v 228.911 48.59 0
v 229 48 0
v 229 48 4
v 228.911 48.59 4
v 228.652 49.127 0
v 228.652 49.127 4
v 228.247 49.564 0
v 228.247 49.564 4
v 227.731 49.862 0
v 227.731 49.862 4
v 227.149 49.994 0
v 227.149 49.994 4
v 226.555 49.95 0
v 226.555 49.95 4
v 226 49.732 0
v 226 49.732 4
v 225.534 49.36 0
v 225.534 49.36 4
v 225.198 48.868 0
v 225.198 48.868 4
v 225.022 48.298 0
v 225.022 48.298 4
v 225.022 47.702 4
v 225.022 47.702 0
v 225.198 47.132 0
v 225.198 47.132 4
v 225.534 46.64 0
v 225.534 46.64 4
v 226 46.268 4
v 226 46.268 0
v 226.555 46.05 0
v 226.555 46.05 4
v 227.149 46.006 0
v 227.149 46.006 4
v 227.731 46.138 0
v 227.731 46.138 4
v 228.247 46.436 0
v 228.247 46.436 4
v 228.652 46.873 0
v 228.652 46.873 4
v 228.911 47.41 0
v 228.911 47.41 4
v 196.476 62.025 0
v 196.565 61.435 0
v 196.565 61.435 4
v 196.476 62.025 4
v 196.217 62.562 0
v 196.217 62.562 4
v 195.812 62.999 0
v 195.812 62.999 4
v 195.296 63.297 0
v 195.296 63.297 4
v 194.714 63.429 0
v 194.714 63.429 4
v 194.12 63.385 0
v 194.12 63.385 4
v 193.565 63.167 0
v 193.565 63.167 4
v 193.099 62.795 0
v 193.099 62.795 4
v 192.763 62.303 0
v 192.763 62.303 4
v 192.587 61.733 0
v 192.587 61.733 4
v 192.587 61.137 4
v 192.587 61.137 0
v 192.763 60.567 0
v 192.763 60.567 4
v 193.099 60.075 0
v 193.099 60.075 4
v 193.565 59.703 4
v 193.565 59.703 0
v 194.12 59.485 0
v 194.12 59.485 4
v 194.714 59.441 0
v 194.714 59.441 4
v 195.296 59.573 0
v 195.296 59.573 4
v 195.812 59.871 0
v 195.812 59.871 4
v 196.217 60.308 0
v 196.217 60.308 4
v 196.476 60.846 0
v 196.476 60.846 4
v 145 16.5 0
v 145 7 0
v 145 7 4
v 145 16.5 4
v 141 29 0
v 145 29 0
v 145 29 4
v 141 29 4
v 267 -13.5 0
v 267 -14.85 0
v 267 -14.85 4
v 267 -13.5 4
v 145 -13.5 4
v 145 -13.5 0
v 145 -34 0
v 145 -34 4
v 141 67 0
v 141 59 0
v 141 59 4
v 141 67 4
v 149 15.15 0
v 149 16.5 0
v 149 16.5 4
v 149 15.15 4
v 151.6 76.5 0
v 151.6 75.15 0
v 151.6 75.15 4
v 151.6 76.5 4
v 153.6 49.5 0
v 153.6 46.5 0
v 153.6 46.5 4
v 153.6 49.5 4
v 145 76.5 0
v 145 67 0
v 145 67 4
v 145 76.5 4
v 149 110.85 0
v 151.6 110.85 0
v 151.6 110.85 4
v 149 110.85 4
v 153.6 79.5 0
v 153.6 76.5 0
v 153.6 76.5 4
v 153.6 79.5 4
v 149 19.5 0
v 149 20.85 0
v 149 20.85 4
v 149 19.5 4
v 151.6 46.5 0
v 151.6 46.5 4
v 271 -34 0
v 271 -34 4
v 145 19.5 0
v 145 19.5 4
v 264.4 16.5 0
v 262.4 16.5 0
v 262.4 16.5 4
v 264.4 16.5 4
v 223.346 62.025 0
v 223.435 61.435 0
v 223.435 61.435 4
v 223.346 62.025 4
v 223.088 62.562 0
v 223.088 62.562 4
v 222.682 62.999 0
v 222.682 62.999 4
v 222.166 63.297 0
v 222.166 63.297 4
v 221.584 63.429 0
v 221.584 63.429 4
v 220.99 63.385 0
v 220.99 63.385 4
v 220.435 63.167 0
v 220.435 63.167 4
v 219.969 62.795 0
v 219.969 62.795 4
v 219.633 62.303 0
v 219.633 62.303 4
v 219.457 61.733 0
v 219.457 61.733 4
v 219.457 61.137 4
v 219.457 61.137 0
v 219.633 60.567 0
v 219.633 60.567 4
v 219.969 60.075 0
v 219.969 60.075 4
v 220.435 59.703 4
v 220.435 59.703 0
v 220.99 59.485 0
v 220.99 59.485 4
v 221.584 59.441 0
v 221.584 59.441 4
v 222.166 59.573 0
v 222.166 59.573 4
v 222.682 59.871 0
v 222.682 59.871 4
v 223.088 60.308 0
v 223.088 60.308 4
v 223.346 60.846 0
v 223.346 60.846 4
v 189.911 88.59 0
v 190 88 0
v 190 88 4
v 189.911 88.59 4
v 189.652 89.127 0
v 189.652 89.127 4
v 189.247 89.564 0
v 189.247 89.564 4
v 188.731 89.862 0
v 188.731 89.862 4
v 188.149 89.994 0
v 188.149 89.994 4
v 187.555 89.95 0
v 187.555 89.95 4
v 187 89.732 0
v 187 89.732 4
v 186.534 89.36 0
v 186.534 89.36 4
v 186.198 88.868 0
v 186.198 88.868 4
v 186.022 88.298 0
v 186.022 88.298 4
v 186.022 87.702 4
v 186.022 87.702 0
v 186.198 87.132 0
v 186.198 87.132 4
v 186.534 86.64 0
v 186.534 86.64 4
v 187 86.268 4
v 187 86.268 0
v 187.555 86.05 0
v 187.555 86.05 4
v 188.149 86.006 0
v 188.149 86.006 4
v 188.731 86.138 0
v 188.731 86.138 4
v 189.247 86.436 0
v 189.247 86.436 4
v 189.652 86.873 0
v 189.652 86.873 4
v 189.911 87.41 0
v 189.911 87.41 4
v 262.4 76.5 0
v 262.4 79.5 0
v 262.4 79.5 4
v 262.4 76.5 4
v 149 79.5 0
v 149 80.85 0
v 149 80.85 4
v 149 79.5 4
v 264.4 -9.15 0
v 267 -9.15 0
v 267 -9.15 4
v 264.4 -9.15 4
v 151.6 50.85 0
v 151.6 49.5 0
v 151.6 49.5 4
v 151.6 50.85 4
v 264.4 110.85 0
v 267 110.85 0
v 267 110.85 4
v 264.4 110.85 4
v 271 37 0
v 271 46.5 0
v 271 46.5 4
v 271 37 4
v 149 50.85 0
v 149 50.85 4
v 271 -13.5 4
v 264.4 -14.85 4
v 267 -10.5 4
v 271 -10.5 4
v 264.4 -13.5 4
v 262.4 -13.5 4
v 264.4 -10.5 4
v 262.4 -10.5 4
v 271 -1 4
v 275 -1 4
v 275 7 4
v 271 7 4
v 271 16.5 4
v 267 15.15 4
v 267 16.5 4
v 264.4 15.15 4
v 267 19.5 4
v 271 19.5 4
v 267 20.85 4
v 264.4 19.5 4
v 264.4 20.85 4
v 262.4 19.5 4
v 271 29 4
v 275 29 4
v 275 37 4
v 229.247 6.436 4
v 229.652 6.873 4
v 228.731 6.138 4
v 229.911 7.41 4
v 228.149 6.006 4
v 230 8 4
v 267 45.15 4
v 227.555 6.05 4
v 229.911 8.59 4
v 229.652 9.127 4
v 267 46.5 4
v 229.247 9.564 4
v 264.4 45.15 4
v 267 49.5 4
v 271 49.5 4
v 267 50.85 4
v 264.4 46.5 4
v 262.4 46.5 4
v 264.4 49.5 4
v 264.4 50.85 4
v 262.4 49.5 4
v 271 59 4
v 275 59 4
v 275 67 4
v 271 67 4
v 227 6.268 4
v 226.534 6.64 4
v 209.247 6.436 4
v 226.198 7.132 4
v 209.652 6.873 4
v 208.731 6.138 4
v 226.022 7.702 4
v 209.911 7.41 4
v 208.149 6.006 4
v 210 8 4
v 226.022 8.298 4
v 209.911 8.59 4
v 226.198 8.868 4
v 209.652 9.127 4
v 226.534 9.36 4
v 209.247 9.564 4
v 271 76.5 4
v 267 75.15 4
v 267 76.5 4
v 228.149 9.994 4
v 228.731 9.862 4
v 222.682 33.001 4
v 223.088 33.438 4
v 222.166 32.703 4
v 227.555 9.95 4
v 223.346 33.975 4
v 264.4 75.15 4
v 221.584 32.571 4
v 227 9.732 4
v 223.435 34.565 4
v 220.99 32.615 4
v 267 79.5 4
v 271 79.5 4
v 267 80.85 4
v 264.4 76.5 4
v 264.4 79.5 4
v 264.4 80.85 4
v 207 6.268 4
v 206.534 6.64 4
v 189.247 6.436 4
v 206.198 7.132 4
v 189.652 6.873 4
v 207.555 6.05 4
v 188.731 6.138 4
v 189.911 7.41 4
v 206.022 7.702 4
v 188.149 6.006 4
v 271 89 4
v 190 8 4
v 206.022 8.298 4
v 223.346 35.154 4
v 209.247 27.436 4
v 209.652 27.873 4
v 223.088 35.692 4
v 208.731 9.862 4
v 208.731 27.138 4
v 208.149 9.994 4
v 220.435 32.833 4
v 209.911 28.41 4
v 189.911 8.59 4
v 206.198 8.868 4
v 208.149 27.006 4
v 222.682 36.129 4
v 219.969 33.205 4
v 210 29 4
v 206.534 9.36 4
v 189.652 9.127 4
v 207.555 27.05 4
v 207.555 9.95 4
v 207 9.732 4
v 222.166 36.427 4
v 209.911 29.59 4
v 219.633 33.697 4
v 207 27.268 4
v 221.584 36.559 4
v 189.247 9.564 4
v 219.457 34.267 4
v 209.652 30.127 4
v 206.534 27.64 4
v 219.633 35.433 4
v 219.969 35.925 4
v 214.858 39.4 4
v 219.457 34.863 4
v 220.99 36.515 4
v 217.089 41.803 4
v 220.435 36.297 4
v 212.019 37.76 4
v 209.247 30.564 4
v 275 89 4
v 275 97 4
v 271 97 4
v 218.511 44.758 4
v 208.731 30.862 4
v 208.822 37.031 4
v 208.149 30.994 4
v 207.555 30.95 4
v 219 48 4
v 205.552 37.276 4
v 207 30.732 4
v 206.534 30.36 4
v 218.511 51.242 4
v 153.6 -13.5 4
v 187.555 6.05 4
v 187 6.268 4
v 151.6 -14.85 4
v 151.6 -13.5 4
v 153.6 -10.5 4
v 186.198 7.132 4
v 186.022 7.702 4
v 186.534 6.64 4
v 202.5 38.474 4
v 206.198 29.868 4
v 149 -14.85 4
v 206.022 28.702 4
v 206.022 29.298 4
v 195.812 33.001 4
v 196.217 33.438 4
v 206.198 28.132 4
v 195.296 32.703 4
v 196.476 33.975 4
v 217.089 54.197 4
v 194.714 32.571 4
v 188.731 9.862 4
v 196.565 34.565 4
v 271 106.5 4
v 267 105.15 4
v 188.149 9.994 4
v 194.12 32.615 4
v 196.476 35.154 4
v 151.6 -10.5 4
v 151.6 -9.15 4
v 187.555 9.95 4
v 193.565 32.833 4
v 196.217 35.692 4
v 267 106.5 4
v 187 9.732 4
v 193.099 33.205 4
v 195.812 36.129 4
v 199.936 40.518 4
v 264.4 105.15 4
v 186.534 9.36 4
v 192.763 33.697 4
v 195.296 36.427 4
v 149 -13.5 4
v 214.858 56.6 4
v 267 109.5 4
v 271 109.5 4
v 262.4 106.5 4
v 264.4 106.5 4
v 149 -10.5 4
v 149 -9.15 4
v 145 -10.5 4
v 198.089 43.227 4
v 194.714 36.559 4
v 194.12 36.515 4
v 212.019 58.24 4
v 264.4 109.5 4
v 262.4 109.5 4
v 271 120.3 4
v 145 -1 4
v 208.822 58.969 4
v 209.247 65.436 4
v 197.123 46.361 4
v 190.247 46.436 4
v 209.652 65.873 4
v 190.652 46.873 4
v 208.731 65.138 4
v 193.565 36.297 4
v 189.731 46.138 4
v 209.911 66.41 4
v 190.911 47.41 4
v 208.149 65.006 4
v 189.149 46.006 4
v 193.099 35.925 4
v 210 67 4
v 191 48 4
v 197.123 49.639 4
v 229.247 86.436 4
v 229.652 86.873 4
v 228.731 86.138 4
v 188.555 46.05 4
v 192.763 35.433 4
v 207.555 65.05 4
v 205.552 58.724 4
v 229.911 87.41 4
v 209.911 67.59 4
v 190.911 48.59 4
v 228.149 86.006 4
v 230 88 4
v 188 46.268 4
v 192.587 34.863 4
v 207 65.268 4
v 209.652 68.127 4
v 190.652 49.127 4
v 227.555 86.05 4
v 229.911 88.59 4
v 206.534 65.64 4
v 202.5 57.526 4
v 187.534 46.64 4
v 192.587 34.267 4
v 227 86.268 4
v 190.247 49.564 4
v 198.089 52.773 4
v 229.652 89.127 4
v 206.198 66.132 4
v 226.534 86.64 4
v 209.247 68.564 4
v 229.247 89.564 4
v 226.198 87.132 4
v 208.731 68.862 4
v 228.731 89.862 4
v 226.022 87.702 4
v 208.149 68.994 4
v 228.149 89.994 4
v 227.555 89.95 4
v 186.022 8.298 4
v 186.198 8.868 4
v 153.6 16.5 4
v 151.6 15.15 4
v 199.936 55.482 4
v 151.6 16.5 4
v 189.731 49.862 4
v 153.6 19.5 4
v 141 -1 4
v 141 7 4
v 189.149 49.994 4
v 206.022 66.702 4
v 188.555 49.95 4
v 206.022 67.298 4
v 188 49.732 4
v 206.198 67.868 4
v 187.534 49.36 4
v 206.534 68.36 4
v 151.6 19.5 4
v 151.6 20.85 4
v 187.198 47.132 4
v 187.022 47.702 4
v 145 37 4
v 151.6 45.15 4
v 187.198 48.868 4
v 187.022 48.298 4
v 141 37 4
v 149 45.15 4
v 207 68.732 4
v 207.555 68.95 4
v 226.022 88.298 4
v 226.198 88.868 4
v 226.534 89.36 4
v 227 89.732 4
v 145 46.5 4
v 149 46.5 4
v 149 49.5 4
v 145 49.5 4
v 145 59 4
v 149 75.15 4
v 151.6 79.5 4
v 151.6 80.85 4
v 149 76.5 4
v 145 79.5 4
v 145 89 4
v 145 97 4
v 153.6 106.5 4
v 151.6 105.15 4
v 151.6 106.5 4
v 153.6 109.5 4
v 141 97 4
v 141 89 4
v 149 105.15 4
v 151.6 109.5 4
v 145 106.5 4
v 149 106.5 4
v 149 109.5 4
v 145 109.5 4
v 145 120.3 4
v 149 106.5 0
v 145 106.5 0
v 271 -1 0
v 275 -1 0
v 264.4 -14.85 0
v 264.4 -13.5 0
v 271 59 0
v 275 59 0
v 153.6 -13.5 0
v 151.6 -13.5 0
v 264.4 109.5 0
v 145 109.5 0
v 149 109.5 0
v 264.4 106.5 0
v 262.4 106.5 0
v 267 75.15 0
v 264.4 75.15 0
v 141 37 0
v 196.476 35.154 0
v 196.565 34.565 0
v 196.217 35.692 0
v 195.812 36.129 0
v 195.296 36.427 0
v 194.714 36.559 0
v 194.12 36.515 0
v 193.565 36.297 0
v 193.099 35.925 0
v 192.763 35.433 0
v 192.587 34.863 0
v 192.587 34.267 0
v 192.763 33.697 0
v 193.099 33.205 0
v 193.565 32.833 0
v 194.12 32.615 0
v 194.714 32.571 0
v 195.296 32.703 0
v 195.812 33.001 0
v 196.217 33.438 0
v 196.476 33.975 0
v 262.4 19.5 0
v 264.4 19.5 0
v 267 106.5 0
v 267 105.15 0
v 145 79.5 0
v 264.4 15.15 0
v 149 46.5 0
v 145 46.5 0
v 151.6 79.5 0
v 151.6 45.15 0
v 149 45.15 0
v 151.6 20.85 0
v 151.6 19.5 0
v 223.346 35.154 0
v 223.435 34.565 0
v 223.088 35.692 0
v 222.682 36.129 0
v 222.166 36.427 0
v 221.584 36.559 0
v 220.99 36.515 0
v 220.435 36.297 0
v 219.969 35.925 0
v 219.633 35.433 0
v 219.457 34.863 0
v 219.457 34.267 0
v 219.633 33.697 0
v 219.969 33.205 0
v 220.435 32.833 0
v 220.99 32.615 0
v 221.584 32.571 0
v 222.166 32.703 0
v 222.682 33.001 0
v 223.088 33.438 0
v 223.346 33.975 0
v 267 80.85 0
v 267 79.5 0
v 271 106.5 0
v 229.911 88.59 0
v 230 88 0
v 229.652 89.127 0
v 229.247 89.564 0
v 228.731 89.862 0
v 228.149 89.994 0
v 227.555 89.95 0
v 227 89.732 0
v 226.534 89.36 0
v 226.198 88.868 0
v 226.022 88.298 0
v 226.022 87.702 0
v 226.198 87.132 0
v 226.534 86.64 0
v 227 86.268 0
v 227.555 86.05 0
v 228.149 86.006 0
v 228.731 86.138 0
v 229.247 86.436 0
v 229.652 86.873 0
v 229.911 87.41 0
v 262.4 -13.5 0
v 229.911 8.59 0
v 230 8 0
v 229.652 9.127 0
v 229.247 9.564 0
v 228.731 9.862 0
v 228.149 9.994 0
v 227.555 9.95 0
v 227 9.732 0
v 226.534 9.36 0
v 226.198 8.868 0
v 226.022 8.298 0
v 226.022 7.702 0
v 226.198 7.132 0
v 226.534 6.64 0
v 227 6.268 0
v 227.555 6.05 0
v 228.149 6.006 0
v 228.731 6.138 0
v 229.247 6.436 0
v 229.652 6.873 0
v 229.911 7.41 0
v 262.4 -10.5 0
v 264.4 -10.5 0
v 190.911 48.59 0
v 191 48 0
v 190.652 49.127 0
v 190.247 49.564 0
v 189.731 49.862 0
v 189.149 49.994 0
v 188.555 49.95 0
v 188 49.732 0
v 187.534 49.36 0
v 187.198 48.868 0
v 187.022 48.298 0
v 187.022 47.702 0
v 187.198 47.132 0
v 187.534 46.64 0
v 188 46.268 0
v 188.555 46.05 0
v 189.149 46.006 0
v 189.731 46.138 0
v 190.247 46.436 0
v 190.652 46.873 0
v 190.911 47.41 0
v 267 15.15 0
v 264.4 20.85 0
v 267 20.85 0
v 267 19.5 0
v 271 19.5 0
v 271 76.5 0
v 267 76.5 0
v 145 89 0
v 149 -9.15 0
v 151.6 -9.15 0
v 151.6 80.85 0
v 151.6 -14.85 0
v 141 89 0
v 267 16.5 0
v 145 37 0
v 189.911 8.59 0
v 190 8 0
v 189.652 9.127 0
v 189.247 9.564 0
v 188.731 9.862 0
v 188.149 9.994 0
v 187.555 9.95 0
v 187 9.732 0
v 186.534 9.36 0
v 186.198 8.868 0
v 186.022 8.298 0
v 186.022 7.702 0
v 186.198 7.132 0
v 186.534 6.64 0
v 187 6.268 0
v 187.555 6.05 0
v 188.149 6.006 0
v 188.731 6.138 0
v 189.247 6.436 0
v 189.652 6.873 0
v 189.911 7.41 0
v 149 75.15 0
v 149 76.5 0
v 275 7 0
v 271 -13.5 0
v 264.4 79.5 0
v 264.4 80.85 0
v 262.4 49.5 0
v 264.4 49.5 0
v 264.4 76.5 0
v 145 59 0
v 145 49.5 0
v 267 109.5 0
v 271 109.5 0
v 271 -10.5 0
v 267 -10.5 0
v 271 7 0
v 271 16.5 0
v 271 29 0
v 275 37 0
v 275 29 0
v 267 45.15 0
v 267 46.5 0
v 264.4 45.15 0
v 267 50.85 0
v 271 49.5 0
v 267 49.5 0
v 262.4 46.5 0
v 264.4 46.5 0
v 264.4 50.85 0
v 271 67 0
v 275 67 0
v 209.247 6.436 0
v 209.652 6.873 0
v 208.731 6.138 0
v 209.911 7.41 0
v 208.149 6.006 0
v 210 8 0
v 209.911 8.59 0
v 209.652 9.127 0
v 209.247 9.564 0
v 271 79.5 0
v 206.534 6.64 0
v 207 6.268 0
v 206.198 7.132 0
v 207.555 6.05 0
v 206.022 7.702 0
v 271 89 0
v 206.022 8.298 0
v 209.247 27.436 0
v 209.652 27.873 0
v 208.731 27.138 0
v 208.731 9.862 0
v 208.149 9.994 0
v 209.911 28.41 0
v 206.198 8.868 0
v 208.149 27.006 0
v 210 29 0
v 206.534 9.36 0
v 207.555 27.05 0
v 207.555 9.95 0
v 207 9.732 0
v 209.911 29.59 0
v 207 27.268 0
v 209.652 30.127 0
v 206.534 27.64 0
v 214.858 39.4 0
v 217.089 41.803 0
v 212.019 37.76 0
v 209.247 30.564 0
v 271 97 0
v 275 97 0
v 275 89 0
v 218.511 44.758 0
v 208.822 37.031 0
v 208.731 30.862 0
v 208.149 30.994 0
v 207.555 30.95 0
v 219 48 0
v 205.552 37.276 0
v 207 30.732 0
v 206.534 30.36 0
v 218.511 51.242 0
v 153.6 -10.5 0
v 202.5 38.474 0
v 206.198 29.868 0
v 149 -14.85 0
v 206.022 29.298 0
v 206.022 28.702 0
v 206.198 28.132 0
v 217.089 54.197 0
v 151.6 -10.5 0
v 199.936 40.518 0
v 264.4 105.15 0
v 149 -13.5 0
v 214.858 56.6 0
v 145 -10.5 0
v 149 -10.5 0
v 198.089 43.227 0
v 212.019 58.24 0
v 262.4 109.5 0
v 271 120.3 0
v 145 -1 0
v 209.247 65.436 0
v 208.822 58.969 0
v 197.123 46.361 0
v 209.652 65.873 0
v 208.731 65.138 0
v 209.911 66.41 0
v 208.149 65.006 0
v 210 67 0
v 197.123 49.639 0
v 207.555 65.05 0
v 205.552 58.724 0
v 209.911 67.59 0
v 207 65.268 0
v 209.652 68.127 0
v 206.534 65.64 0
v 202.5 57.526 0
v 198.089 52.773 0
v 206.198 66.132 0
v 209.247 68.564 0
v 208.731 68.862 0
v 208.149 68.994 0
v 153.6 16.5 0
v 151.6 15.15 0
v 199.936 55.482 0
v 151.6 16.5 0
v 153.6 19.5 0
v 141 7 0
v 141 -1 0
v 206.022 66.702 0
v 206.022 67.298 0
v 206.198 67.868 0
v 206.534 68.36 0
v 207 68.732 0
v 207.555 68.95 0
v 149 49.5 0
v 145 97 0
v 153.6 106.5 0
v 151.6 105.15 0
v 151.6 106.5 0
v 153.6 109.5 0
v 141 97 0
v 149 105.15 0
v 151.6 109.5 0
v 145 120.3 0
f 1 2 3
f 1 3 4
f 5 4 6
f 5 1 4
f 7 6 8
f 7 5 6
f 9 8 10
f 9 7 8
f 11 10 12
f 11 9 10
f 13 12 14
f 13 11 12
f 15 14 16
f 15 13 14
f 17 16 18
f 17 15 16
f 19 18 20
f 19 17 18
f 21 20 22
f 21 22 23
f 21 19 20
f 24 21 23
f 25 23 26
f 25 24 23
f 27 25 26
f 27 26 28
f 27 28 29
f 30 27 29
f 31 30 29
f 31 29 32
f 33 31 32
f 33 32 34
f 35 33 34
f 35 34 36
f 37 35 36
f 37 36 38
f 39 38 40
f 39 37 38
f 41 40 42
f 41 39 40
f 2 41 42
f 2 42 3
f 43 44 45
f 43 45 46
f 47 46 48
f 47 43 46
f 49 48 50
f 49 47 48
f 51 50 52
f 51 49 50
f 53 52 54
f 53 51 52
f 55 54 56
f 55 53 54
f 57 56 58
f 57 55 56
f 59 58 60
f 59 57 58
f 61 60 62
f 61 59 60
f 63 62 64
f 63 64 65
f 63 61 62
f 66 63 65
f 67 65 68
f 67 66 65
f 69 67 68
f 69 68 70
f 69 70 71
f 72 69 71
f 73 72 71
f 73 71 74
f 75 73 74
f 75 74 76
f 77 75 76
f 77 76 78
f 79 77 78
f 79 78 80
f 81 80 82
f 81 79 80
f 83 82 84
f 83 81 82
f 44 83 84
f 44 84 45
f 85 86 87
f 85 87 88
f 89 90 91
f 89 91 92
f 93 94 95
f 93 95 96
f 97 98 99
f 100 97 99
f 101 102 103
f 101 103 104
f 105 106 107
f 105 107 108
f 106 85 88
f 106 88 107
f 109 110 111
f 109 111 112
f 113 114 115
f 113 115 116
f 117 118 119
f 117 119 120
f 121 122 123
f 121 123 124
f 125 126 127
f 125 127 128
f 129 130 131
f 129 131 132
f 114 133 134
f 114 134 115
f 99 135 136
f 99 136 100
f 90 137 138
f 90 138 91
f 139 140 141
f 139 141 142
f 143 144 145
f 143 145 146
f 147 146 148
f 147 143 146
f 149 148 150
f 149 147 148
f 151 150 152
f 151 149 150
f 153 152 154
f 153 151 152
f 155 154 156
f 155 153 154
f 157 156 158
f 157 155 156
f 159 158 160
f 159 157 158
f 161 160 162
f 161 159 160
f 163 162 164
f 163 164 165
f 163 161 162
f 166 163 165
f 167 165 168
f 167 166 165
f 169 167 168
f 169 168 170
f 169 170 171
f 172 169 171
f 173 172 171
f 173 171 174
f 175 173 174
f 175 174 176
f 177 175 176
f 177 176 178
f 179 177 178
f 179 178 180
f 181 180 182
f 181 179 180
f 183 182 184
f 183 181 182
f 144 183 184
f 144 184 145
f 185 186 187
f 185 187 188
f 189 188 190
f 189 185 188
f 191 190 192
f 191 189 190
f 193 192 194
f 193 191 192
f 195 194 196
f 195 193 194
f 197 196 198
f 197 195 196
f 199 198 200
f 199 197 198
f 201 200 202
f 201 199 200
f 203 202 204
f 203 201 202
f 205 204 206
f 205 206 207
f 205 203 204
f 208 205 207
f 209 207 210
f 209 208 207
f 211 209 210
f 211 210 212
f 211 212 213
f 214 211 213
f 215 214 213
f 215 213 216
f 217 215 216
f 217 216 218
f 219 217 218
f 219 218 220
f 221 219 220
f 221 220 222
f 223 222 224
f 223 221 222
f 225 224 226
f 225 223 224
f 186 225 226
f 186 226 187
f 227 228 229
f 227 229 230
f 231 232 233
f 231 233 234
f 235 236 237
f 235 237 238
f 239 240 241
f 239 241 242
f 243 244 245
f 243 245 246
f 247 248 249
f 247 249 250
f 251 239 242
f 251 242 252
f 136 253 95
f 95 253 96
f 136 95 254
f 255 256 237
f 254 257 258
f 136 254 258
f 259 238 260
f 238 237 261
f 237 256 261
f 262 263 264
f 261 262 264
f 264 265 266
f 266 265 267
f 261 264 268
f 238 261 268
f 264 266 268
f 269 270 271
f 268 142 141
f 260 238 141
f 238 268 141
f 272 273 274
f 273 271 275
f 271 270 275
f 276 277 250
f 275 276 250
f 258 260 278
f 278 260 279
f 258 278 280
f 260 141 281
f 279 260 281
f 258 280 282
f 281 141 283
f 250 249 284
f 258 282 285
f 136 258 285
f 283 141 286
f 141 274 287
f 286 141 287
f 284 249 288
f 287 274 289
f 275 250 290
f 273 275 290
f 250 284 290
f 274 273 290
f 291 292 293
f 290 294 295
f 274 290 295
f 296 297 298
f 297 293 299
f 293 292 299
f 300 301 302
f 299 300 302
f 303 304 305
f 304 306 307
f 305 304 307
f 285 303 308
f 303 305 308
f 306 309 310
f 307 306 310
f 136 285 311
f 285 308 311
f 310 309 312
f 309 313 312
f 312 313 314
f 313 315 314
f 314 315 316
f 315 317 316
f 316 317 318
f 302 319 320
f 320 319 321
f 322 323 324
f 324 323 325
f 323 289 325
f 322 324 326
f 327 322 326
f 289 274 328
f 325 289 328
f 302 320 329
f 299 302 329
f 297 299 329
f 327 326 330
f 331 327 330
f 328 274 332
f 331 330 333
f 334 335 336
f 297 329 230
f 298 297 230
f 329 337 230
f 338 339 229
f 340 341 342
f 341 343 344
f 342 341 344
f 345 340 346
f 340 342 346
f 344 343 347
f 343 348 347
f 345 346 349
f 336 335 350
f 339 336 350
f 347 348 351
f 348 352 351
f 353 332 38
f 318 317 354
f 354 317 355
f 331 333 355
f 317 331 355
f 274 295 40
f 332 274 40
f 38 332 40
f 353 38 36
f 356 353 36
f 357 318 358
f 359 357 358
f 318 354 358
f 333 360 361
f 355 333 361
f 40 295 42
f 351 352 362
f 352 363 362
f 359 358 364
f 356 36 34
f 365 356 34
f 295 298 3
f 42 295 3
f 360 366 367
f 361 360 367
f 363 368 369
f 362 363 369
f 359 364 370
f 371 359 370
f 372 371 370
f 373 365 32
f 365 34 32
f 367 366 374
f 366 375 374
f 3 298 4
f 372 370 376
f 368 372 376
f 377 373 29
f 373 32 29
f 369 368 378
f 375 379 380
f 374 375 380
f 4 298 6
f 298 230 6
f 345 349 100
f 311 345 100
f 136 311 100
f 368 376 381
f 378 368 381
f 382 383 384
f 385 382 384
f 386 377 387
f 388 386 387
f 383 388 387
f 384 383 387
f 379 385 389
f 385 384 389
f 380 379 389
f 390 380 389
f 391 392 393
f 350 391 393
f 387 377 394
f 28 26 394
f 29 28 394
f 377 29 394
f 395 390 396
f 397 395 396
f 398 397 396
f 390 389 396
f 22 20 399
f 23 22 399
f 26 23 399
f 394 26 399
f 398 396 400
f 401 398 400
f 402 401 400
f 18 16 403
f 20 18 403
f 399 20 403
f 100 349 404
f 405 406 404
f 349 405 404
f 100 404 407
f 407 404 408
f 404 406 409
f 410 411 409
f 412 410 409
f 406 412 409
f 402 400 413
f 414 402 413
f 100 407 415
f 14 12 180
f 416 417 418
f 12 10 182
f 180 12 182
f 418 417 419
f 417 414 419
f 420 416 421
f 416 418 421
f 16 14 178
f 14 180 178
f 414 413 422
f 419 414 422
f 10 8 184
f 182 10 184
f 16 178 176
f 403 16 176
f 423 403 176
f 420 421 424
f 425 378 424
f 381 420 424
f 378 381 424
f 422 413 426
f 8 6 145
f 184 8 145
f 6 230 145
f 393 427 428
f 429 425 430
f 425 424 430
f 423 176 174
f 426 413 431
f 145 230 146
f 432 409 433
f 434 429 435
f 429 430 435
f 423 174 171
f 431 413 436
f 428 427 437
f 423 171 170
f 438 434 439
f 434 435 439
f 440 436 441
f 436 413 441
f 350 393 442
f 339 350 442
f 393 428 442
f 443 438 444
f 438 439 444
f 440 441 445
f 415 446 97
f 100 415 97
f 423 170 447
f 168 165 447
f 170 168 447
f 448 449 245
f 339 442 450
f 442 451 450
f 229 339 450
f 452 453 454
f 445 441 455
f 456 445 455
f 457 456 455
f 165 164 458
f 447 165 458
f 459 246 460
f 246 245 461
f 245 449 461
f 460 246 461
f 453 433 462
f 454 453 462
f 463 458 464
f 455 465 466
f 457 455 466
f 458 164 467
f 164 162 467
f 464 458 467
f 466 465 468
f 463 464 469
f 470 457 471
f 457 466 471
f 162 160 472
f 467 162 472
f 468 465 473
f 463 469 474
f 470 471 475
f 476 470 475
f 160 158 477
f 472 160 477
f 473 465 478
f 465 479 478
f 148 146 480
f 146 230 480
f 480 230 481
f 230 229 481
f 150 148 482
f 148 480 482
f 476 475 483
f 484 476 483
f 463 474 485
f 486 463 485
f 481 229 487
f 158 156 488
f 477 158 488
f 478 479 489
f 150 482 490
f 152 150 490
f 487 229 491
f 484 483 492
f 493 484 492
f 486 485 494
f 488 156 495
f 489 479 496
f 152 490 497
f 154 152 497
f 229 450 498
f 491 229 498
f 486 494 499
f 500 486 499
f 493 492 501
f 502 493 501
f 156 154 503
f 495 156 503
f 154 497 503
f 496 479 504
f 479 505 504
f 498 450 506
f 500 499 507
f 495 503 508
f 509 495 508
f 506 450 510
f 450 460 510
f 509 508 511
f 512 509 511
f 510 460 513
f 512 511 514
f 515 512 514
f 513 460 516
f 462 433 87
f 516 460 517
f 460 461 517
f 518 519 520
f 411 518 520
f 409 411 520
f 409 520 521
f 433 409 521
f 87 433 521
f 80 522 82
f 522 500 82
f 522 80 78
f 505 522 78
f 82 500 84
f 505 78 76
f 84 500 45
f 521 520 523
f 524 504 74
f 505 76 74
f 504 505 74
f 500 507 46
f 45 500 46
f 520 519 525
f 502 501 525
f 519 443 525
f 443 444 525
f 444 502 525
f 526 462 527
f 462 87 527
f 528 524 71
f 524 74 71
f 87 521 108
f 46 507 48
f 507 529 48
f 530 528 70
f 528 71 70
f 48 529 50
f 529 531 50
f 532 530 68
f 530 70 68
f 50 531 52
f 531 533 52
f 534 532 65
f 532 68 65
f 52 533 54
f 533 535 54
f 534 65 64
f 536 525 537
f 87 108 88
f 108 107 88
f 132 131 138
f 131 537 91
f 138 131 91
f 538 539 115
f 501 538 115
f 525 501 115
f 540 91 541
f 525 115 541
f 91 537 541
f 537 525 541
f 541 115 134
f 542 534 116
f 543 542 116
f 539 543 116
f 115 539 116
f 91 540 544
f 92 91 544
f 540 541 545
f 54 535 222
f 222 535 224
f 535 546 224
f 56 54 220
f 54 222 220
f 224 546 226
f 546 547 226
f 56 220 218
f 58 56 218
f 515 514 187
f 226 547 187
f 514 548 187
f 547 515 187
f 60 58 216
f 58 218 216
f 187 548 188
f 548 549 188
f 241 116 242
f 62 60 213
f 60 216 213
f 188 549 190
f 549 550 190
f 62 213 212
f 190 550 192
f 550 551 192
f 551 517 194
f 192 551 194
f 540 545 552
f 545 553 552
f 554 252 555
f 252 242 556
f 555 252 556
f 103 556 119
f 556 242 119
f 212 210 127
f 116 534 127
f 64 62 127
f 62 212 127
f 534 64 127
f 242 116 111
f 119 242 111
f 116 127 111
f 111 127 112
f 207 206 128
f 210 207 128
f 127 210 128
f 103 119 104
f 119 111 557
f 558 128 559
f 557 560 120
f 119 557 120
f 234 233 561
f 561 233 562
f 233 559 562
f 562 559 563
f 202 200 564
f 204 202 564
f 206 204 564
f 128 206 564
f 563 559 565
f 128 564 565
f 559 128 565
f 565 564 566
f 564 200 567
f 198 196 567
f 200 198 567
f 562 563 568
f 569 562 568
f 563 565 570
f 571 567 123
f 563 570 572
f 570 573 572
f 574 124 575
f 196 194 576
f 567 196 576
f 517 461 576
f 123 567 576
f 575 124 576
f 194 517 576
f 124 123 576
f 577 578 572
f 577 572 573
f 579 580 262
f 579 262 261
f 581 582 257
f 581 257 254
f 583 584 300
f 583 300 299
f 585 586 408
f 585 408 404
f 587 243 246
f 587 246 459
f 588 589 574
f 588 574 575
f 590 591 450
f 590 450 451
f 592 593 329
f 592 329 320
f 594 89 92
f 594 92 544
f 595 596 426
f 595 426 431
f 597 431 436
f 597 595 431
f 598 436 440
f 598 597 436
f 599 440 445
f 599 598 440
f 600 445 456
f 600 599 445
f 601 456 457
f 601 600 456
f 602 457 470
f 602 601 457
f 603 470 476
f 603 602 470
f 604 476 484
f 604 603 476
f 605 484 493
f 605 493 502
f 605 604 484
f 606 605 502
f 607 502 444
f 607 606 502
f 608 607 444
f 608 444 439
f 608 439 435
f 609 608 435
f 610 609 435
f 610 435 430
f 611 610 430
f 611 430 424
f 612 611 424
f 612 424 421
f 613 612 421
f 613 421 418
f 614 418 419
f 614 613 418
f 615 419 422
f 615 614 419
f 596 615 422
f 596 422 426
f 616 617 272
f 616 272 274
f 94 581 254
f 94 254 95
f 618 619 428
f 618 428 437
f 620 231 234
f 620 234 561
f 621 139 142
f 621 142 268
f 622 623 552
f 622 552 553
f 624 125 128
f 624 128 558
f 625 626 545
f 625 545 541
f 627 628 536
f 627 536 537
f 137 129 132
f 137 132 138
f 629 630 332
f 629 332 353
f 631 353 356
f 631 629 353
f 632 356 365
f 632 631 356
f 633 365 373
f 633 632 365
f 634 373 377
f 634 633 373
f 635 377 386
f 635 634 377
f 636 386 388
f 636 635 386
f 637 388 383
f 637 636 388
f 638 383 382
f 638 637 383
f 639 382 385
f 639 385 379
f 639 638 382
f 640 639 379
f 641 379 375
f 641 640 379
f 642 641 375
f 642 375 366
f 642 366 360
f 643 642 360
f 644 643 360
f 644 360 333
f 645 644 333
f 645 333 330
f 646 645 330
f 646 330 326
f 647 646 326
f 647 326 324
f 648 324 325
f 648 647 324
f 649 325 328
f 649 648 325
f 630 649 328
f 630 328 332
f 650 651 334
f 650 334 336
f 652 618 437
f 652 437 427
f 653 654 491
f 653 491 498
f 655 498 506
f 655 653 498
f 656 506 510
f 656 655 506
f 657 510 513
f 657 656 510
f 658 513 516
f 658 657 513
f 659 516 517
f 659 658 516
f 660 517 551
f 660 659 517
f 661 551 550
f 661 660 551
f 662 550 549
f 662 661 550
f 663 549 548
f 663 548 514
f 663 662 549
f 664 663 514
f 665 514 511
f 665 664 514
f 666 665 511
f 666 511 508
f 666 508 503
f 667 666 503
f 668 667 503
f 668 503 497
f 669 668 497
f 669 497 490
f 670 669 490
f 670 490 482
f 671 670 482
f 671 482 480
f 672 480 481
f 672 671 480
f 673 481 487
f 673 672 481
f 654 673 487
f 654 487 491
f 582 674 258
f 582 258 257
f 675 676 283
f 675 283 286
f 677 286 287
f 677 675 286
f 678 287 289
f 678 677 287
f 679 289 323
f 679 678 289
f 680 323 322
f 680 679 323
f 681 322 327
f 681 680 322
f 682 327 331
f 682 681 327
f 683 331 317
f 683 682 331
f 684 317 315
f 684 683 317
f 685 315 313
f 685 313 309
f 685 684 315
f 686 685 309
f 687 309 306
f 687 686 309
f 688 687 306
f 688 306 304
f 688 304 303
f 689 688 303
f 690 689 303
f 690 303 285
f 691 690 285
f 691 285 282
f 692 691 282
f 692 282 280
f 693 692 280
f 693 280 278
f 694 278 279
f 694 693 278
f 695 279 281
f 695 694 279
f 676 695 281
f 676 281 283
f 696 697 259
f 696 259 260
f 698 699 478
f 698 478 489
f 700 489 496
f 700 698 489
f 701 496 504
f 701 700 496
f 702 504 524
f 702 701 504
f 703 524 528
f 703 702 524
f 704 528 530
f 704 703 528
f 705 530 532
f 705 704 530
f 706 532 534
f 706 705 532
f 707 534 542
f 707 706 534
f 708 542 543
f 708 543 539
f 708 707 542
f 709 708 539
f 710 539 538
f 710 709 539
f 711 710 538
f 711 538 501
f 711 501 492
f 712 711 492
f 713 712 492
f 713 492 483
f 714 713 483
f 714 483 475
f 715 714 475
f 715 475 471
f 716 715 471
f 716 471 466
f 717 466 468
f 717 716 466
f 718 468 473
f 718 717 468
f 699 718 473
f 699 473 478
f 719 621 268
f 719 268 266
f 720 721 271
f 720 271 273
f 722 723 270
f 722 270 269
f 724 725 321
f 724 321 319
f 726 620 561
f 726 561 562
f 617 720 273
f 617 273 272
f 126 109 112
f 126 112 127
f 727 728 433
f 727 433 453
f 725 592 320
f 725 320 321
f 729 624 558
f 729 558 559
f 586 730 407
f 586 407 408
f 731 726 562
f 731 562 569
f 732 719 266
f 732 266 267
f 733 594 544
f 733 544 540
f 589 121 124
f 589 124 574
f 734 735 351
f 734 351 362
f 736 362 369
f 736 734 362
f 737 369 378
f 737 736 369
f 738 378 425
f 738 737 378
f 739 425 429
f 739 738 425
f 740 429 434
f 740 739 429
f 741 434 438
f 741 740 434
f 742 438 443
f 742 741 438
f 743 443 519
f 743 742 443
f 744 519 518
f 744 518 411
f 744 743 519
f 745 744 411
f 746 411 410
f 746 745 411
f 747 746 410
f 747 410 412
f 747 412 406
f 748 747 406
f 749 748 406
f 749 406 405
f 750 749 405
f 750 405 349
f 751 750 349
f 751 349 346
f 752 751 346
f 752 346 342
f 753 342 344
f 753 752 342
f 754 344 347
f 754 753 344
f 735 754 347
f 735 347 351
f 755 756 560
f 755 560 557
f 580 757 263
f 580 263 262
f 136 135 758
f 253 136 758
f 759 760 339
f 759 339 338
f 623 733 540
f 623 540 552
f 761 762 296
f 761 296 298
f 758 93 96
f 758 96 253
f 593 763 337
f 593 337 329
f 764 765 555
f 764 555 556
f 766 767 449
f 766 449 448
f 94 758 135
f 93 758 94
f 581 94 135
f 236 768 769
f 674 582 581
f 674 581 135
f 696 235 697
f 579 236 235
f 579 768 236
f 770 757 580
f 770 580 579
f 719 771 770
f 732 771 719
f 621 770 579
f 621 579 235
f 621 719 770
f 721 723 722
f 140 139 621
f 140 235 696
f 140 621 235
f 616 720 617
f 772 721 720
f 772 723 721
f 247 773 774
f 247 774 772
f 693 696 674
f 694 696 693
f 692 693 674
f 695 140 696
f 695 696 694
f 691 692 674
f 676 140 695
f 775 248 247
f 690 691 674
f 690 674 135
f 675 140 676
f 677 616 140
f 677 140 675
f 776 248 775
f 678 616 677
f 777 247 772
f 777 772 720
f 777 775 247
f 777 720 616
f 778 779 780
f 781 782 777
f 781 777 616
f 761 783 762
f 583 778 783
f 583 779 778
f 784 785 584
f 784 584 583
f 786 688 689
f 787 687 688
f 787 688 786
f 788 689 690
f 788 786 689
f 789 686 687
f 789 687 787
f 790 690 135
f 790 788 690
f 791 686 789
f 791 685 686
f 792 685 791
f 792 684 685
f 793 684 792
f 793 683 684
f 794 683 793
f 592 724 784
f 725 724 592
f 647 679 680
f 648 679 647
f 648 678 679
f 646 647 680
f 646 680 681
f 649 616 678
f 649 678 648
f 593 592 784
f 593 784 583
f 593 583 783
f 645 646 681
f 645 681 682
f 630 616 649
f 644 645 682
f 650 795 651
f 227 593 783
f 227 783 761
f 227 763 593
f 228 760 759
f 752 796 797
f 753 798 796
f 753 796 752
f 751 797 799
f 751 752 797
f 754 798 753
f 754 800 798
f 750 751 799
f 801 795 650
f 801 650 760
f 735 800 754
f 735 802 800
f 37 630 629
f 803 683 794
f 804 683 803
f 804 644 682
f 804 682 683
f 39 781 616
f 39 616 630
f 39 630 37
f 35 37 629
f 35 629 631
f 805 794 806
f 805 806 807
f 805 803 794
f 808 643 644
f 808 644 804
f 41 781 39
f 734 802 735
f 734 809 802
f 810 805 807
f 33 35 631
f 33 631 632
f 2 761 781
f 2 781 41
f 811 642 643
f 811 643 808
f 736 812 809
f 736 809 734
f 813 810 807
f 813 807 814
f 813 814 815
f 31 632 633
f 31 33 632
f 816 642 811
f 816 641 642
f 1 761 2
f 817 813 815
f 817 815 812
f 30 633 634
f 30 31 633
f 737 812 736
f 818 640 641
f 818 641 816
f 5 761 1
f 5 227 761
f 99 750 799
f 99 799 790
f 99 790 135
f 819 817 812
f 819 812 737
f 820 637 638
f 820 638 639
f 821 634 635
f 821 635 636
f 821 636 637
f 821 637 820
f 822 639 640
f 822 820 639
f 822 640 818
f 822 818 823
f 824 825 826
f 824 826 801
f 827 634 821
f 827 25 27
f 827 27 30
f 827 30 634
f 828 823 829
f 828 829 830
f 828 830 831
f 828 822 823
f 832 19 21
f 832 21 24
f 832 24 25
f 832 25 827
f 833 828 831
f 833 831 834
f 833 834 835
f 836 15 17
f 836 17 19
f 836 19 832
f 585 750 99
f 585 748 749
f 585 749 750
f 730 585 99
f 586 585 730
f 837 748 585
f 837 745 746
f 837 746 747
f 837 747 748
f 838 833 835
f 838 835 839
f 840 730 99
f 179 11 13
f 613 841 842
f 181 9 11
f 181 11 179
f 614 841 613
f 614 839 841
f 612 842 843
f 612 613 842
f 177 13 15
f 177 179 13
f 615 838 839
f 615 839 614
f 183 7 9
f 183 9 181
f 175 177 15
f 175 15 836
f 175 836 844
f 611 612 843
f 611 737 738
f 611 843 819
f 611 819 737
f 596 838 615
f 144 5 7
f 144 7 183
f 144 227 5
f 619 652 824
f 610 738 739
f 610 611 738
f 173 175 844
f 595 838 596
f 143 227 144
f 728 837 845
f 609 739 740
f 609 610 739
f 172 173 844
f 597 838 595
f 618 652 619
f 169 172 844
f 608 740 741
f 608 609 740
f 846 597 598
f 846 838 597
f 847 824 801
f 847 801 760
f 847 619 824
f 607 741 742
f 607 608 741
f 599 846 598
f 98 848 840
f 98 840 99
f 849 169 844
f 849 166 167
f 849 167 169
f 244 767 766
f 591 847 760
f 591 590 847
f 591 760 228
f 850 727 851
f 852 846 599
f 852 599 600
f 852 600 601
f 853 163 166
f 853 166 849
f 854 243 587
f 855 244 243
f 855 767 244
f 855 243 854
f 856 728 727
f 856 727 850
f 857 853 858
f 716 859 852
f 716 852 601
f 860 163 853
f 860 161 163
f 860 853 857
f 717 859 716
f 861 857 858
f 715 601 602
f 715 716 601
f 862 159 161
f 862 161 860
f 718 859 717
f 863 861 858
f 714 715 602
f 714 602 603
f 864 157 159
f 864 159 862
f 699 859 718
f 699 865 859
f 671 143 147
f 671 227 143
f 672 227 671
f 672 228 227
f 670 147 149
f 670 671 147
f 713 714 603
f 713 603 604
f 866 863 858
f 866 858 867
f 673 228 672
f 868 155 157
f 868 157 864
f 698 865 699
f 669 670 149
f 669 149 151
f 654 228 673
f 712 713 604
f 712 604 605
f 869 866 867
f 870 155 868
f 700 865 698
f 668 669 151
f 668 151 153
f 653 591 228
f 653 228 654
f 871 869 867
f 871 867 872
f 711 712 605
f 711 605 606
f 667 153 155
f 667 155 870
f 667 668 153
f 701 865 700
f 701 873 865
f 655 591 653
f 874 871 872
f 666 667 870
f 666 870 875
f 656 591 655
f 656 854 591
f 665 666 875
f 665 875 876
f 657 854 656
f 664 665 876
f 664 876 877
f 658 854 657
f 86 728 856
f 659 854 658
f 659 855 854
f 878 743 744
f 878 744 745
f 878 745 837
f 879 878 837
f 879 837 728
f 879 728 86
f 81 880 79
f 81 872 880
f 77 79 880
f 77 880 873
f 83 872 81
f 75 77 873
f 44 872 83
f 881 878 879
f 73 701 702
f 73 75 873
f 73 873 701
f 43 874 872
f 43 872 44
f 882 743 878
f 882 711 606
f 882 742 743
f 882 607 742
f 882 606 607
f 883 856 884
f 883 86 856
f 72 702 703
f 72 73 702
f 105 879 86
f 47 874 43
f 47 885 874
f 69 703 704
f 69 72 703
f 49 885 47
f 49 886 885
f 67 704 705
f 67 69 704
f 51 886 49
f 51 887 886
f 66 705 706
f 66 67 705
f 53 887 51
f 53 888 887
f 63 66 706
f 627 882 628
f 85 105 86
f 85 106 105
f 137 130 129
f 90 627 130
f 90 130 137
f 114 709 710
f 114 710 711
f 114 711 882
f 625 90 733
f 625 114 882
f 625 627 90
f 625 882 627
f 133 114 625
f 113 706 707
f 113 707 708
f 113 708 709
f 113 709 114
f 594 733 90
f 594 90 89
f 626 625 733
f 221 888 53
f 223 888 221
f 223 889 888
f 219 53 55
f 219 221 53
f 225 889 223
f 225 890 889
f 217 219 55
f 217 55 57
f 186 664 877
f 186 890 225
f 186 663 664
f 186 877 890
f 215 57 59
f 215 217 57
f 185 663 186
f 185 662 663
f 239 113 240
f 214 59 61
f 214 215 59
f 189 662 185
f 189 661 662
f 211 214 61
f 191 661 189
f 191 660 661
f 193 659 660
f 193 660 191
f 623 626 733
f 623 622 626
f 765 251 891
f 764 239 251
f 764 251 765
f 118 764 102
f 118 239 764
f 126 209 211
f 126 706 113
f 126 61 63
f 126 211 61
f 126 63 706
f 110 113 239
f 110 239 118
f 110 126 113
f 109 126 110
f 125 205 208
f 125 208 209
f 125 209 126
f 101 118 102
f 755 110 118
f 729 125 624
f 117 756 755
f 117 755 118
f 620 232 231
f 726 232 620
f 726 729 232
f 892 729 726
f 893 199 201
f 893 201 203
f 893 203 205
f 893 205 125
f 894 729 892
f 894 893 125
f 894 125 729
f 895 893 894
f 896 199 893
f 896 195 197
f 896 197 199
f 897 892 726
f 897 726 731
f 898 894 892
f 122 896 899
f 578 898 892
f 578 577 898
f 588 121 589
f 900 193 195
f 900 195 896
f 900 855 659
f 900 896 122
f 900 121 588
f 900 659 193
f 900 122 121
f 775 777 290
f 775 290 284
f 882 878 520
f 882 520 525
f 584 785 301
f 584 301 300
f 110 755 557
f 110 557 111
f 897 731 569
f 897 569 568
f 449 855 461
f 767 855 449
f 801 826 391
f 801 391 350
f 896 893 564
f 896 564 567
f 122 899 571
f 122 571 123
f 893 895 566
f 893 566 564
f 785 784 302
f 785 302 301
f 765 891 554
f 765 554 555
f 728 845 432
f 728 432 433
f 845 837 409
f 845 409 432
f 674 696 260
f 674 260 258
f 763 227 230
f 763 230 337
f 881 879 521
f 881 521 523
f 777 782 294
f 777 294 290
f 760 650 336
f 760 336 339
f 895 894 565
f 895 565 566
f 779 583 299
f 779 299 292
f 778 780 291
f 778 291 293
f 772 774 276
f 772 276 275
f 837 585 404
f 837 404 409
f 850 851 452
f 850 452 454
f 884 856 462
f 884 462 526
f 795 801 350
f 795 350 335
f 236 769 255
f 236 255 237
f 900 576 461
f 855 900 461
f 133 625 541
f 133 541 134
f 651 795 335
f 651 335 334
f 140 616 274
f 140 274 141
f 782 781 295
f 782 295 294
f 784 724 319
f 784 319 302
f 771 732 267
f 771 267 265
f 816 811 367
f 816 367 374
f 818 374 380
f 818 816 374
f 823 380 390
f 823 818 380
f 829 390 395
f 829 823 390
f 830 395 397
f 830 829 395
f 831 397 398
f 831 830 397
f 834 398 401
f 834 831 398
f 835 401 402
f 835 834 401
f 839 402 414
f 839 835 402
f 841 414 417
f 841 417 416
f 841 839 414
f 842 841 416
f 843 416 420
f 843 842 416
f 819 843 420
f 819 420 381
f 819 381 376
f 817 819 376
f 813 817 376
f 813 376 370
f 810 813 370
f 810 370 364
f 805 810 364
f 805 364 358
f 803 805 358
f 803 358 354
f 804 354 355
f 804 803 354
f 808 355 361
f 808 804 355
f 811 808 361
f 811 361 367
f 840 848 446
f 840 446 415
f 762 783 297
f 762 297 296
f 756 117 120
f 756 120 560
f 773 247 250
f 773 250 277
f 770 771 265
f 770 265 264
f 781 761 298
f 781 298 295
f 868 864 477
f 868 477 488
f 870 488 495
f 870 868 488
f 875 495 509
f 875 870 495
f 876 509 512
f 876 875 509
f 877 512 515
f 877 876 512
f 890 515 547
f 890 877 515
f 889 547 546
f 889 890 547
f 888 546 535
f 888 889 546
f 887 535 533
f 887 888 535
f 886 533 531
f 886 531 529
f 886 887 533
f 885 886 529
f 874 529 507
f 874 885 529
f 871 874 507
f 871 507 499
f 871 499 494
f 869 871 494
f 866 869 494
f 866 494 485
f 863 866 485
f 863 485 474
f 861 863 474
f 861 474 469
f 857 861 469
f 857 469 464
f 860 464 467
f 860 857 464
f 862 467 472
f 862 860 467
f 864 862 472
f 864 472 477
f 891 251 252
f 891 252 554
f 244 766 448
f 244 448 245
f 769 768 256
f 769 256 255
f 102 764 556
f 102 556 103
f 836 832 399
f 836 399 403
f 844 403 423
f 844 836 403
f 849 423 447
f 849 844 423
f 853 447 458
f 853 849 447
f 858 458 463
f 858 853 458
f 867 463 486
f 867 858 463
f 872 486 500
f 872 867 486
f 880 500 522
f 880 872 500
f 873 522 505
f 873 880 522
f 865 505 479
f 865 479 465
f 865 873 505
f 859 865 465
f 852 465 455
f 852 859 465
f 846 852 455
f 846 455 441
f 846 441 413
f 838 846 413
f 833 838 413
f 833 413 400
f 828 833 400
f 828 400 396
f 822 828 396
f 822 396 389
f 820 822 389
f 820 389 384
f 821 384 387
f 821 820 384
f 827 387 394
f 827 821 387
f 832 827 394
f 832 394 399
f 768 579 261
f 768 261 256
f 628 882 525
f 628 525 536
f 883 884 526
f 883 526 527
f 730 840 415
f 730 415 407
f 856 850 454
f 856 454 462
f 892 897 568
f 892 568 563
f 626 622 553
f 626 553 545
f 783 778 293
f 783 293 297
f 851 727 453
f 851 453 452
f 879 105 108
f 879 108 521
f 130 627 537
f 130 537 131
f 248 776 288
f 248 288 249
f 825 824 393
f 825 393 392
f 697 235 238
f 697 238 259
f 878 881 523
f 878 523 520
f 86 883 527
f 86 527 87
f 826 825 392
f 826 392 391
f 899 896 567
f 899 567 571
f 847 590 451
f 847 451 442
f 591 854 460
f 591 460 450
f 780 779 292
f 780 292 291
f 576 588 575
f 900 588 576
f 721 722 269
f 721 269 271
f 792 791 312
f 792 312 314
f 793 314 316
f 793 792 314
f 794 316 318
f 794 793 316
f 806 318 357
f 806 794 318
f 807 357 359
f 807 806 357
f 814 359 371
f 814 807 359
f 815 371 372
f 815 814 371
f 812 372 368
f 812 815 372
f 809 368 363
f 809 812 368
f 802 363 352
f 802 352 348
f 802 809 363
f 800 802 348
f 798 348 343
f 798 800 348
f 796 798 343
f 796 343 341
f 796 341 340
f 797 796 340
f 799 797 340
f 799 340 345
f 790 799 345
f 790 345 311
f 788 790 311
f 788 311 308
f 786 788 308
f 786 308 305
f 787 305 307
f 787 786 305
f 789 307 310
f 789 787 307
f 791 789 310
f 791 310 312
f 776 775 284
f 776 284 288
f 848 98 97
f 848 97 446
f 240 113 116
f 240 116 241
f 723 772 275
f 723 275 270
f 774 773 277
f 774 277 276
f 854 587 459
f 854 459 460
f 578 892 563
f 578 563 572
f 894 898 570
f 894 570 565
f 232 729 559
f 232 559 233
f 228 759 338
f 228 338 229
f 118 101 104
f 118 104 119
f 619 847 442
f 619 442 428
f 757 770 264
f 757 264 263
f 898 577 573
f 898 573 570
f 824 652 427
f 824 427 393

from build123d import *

# Parameters (mm, degrees)
SKETCH_1_R          = 2
SKETCH_1_R_2        = 11
EXTRUDE_1_DEPTH     = 4
SKETCH_3_W          = 126
SKETCH_3_H          = 2.7
CUT_EXTRUDE_1_DEPTH = 10


with BuildPart() as part:
    # 草图1 → 凸台-拉伸1 (new body)
    with BuildSketch(Plane.XY):
        Polygon((145, 46.5), (149, 46.5), (149, 45.15), (151.6, 45.15), (151.6, 46.5), (153.6, 46.5), (153.6, 49.5), (151.6, 49.5), (151.6, 50.85), (149, 50.85), (149, 49.5), (145, 49.5), (145, 59), (141, 59), (141, 67), (145, 67), (145, 76.5), (149, 76.5), (149, 75.15), (151.6, 75.15), (151.6, 76.5), (153.6, 76.5), (153.6, 79.5), (151.6, 79.5), (151.6, 80.85), (149, 80.85), (149, 79.5), (145, 79.5), (145, 89), (141, 89), (141, 97), (145, 97), (145, 106.5), (149, 106.5), (149, 105.15), (151.6, 105.15), (151.6, 106.5), (153.6, 106.5), (153.6, 109.5), (151.6, 109.5), (151.6, 110.85), (149, 110.85), (149, 109.5), (145, 109.5), (145, 123), (271, 123), (271, 109.5), (267, 109.5), (267, 110.85), (264.4, 110.85), (264.4, 109.5), (262.4, 109.5), (262.4, 106.5), (264.4, 106.5), (264.4, 105.15), (267, 105.15), (267, 106.5), (271, 106.5), (271, 97), (275, 97), (275, 89), (271, 89), (271, 79.5), (267, 79.5), (267, 80.85), (264.4, 80.85), (264.4, 79.5), (262.4, 79.5), (262.4, 76.5), (264.4, 76.5), (264.4, 75.15), (267, 75.15), (267, 76.5), (271, 76.5), (271, 67), (275, 67), (275, 59), (271, 59), (271, 49.5), (267, 49.5), (267, 50.85), (264.4, 50.85), (264.4, 49.5), (262.4, 49.5), (262.4, 46.5), (264.4, 46.5), (264.4, 45.15), (267, 45.15), (267, 46.5), (271, 46.5), (271, 37), (275, 37), (275, 29), (271, 29), (271, 19.5), (267, 19.5), (267, 20.85), (264.4, 20.85), (264.4, 19.5), (262.4, 19.5), (262.4, 16.5), (264.4, 16.5), (264.4, 15.15), (267, 15.15), (267, 16.5), (271, 16.5), (271, 7), (275, 7), (275, -1), (271, -1), (271, -10.5), (267, -10.5), (267, -9.15), (264.4, -9.15), (264.4, -10.5), (262.4, -10.5), (262.4, -13.5), (264.4, -13.5), (264.4, -14.85), (267, -14.85), (267, -13.5), (271, -13.5), (271, -27), (271, -34), (145, -34), (145, -27), (145, -13.5), (149, -13.5), (149, -14.85), (151.6, -14.85), (151.6, -13.5), (153.6, -13.5), (153.6, -10.5), (151.6, -10.5), (151.6, -9.15), (149, -9.15), (149, -10.5), (145, -10.5), (145, -1), (141, -1), (141, 7), (145, 7), (145, 16.5), (149, 16.5), (149, 15.15), (151.6, 15.15), (151.6, 16.5), (153.6, 16.5), (153.6, 19.5), (151.6, 19.5), (151.6, 20.85), (149, 20.85), (149, 19.5), (145, 19.5), (145, 29), (141, 29), (141, 37), (145, 37), align=None)
        with Locations((208, 29)):
            Circle(SKETCH_1_R, mode=Mode.SUBTRACT)
        with Locations((208, 48)):
            Circle(SKETCH_1_R_2, mode=Mode.SUBTRACT)
        with Locations((188, 8)):
            Circle(SKETCH_1_R, mode=Mode.SUBTRACT)
        with Locations((228, 8)):
            Circle(SKETCH_1_R, mode=Mode.SUBTRACT)
        with Locations((228, 88)):
            Circle(SKETCH_1_R, mode=Mode.SUBTRACT)
        with Locations((188, 88)):
            Circle(SKETCH_1_R, mode=Mode.SUBTRACT)
        with Locations((208, 8)):
            Circle(SKETCH_1_R, mode=Mode.SUBTRACT)
        with Locations((194.564971157, 34.564971157)):
            Circle(SKETCH_1_R, mode=Mode.SUBTRACT)
        with Locations((189, 48)):
            Circle(SKETCH_1_R, mode=Mode.SUBTRACT)
        with Locations((194.564971157, 61.435028843)):
            Circle(SKETCH_1_R, mode=Mode.SUBTRACT)
        with Locations((208, 67)):
            Circle(SKETCH_1_R, mode=Mode.SUBTRACT)
        with Locations((221.435028843, 61.435028843)):
            Circle(SKETCH_1_R, mode=Mode.SUBTRACT)
        with Locations((227, 48)):
            Circle(SKETCH_1_R, mode=Mode.SUBTRACT)
        with Locations((221.435028843, 34.564971157)):
            Circle(SKETCH_1_R, mode=Mode.SUBTRACT)
    extrude(amount=EXTRUDE_1_DEPTH)

    # 草图3 → 切除-拉伸1 (cut)
    with BuildSketch(Plane.XY.offset(4)):
        with Locations((208, 121.65)):
            Rectangle(SKETCH_3_W, SKETCH_3_H)
    extrude(amount=-CUT_EXTRUDE_1_DEPTH, mode=Mode.SUBTRACT)


solid = part.part
